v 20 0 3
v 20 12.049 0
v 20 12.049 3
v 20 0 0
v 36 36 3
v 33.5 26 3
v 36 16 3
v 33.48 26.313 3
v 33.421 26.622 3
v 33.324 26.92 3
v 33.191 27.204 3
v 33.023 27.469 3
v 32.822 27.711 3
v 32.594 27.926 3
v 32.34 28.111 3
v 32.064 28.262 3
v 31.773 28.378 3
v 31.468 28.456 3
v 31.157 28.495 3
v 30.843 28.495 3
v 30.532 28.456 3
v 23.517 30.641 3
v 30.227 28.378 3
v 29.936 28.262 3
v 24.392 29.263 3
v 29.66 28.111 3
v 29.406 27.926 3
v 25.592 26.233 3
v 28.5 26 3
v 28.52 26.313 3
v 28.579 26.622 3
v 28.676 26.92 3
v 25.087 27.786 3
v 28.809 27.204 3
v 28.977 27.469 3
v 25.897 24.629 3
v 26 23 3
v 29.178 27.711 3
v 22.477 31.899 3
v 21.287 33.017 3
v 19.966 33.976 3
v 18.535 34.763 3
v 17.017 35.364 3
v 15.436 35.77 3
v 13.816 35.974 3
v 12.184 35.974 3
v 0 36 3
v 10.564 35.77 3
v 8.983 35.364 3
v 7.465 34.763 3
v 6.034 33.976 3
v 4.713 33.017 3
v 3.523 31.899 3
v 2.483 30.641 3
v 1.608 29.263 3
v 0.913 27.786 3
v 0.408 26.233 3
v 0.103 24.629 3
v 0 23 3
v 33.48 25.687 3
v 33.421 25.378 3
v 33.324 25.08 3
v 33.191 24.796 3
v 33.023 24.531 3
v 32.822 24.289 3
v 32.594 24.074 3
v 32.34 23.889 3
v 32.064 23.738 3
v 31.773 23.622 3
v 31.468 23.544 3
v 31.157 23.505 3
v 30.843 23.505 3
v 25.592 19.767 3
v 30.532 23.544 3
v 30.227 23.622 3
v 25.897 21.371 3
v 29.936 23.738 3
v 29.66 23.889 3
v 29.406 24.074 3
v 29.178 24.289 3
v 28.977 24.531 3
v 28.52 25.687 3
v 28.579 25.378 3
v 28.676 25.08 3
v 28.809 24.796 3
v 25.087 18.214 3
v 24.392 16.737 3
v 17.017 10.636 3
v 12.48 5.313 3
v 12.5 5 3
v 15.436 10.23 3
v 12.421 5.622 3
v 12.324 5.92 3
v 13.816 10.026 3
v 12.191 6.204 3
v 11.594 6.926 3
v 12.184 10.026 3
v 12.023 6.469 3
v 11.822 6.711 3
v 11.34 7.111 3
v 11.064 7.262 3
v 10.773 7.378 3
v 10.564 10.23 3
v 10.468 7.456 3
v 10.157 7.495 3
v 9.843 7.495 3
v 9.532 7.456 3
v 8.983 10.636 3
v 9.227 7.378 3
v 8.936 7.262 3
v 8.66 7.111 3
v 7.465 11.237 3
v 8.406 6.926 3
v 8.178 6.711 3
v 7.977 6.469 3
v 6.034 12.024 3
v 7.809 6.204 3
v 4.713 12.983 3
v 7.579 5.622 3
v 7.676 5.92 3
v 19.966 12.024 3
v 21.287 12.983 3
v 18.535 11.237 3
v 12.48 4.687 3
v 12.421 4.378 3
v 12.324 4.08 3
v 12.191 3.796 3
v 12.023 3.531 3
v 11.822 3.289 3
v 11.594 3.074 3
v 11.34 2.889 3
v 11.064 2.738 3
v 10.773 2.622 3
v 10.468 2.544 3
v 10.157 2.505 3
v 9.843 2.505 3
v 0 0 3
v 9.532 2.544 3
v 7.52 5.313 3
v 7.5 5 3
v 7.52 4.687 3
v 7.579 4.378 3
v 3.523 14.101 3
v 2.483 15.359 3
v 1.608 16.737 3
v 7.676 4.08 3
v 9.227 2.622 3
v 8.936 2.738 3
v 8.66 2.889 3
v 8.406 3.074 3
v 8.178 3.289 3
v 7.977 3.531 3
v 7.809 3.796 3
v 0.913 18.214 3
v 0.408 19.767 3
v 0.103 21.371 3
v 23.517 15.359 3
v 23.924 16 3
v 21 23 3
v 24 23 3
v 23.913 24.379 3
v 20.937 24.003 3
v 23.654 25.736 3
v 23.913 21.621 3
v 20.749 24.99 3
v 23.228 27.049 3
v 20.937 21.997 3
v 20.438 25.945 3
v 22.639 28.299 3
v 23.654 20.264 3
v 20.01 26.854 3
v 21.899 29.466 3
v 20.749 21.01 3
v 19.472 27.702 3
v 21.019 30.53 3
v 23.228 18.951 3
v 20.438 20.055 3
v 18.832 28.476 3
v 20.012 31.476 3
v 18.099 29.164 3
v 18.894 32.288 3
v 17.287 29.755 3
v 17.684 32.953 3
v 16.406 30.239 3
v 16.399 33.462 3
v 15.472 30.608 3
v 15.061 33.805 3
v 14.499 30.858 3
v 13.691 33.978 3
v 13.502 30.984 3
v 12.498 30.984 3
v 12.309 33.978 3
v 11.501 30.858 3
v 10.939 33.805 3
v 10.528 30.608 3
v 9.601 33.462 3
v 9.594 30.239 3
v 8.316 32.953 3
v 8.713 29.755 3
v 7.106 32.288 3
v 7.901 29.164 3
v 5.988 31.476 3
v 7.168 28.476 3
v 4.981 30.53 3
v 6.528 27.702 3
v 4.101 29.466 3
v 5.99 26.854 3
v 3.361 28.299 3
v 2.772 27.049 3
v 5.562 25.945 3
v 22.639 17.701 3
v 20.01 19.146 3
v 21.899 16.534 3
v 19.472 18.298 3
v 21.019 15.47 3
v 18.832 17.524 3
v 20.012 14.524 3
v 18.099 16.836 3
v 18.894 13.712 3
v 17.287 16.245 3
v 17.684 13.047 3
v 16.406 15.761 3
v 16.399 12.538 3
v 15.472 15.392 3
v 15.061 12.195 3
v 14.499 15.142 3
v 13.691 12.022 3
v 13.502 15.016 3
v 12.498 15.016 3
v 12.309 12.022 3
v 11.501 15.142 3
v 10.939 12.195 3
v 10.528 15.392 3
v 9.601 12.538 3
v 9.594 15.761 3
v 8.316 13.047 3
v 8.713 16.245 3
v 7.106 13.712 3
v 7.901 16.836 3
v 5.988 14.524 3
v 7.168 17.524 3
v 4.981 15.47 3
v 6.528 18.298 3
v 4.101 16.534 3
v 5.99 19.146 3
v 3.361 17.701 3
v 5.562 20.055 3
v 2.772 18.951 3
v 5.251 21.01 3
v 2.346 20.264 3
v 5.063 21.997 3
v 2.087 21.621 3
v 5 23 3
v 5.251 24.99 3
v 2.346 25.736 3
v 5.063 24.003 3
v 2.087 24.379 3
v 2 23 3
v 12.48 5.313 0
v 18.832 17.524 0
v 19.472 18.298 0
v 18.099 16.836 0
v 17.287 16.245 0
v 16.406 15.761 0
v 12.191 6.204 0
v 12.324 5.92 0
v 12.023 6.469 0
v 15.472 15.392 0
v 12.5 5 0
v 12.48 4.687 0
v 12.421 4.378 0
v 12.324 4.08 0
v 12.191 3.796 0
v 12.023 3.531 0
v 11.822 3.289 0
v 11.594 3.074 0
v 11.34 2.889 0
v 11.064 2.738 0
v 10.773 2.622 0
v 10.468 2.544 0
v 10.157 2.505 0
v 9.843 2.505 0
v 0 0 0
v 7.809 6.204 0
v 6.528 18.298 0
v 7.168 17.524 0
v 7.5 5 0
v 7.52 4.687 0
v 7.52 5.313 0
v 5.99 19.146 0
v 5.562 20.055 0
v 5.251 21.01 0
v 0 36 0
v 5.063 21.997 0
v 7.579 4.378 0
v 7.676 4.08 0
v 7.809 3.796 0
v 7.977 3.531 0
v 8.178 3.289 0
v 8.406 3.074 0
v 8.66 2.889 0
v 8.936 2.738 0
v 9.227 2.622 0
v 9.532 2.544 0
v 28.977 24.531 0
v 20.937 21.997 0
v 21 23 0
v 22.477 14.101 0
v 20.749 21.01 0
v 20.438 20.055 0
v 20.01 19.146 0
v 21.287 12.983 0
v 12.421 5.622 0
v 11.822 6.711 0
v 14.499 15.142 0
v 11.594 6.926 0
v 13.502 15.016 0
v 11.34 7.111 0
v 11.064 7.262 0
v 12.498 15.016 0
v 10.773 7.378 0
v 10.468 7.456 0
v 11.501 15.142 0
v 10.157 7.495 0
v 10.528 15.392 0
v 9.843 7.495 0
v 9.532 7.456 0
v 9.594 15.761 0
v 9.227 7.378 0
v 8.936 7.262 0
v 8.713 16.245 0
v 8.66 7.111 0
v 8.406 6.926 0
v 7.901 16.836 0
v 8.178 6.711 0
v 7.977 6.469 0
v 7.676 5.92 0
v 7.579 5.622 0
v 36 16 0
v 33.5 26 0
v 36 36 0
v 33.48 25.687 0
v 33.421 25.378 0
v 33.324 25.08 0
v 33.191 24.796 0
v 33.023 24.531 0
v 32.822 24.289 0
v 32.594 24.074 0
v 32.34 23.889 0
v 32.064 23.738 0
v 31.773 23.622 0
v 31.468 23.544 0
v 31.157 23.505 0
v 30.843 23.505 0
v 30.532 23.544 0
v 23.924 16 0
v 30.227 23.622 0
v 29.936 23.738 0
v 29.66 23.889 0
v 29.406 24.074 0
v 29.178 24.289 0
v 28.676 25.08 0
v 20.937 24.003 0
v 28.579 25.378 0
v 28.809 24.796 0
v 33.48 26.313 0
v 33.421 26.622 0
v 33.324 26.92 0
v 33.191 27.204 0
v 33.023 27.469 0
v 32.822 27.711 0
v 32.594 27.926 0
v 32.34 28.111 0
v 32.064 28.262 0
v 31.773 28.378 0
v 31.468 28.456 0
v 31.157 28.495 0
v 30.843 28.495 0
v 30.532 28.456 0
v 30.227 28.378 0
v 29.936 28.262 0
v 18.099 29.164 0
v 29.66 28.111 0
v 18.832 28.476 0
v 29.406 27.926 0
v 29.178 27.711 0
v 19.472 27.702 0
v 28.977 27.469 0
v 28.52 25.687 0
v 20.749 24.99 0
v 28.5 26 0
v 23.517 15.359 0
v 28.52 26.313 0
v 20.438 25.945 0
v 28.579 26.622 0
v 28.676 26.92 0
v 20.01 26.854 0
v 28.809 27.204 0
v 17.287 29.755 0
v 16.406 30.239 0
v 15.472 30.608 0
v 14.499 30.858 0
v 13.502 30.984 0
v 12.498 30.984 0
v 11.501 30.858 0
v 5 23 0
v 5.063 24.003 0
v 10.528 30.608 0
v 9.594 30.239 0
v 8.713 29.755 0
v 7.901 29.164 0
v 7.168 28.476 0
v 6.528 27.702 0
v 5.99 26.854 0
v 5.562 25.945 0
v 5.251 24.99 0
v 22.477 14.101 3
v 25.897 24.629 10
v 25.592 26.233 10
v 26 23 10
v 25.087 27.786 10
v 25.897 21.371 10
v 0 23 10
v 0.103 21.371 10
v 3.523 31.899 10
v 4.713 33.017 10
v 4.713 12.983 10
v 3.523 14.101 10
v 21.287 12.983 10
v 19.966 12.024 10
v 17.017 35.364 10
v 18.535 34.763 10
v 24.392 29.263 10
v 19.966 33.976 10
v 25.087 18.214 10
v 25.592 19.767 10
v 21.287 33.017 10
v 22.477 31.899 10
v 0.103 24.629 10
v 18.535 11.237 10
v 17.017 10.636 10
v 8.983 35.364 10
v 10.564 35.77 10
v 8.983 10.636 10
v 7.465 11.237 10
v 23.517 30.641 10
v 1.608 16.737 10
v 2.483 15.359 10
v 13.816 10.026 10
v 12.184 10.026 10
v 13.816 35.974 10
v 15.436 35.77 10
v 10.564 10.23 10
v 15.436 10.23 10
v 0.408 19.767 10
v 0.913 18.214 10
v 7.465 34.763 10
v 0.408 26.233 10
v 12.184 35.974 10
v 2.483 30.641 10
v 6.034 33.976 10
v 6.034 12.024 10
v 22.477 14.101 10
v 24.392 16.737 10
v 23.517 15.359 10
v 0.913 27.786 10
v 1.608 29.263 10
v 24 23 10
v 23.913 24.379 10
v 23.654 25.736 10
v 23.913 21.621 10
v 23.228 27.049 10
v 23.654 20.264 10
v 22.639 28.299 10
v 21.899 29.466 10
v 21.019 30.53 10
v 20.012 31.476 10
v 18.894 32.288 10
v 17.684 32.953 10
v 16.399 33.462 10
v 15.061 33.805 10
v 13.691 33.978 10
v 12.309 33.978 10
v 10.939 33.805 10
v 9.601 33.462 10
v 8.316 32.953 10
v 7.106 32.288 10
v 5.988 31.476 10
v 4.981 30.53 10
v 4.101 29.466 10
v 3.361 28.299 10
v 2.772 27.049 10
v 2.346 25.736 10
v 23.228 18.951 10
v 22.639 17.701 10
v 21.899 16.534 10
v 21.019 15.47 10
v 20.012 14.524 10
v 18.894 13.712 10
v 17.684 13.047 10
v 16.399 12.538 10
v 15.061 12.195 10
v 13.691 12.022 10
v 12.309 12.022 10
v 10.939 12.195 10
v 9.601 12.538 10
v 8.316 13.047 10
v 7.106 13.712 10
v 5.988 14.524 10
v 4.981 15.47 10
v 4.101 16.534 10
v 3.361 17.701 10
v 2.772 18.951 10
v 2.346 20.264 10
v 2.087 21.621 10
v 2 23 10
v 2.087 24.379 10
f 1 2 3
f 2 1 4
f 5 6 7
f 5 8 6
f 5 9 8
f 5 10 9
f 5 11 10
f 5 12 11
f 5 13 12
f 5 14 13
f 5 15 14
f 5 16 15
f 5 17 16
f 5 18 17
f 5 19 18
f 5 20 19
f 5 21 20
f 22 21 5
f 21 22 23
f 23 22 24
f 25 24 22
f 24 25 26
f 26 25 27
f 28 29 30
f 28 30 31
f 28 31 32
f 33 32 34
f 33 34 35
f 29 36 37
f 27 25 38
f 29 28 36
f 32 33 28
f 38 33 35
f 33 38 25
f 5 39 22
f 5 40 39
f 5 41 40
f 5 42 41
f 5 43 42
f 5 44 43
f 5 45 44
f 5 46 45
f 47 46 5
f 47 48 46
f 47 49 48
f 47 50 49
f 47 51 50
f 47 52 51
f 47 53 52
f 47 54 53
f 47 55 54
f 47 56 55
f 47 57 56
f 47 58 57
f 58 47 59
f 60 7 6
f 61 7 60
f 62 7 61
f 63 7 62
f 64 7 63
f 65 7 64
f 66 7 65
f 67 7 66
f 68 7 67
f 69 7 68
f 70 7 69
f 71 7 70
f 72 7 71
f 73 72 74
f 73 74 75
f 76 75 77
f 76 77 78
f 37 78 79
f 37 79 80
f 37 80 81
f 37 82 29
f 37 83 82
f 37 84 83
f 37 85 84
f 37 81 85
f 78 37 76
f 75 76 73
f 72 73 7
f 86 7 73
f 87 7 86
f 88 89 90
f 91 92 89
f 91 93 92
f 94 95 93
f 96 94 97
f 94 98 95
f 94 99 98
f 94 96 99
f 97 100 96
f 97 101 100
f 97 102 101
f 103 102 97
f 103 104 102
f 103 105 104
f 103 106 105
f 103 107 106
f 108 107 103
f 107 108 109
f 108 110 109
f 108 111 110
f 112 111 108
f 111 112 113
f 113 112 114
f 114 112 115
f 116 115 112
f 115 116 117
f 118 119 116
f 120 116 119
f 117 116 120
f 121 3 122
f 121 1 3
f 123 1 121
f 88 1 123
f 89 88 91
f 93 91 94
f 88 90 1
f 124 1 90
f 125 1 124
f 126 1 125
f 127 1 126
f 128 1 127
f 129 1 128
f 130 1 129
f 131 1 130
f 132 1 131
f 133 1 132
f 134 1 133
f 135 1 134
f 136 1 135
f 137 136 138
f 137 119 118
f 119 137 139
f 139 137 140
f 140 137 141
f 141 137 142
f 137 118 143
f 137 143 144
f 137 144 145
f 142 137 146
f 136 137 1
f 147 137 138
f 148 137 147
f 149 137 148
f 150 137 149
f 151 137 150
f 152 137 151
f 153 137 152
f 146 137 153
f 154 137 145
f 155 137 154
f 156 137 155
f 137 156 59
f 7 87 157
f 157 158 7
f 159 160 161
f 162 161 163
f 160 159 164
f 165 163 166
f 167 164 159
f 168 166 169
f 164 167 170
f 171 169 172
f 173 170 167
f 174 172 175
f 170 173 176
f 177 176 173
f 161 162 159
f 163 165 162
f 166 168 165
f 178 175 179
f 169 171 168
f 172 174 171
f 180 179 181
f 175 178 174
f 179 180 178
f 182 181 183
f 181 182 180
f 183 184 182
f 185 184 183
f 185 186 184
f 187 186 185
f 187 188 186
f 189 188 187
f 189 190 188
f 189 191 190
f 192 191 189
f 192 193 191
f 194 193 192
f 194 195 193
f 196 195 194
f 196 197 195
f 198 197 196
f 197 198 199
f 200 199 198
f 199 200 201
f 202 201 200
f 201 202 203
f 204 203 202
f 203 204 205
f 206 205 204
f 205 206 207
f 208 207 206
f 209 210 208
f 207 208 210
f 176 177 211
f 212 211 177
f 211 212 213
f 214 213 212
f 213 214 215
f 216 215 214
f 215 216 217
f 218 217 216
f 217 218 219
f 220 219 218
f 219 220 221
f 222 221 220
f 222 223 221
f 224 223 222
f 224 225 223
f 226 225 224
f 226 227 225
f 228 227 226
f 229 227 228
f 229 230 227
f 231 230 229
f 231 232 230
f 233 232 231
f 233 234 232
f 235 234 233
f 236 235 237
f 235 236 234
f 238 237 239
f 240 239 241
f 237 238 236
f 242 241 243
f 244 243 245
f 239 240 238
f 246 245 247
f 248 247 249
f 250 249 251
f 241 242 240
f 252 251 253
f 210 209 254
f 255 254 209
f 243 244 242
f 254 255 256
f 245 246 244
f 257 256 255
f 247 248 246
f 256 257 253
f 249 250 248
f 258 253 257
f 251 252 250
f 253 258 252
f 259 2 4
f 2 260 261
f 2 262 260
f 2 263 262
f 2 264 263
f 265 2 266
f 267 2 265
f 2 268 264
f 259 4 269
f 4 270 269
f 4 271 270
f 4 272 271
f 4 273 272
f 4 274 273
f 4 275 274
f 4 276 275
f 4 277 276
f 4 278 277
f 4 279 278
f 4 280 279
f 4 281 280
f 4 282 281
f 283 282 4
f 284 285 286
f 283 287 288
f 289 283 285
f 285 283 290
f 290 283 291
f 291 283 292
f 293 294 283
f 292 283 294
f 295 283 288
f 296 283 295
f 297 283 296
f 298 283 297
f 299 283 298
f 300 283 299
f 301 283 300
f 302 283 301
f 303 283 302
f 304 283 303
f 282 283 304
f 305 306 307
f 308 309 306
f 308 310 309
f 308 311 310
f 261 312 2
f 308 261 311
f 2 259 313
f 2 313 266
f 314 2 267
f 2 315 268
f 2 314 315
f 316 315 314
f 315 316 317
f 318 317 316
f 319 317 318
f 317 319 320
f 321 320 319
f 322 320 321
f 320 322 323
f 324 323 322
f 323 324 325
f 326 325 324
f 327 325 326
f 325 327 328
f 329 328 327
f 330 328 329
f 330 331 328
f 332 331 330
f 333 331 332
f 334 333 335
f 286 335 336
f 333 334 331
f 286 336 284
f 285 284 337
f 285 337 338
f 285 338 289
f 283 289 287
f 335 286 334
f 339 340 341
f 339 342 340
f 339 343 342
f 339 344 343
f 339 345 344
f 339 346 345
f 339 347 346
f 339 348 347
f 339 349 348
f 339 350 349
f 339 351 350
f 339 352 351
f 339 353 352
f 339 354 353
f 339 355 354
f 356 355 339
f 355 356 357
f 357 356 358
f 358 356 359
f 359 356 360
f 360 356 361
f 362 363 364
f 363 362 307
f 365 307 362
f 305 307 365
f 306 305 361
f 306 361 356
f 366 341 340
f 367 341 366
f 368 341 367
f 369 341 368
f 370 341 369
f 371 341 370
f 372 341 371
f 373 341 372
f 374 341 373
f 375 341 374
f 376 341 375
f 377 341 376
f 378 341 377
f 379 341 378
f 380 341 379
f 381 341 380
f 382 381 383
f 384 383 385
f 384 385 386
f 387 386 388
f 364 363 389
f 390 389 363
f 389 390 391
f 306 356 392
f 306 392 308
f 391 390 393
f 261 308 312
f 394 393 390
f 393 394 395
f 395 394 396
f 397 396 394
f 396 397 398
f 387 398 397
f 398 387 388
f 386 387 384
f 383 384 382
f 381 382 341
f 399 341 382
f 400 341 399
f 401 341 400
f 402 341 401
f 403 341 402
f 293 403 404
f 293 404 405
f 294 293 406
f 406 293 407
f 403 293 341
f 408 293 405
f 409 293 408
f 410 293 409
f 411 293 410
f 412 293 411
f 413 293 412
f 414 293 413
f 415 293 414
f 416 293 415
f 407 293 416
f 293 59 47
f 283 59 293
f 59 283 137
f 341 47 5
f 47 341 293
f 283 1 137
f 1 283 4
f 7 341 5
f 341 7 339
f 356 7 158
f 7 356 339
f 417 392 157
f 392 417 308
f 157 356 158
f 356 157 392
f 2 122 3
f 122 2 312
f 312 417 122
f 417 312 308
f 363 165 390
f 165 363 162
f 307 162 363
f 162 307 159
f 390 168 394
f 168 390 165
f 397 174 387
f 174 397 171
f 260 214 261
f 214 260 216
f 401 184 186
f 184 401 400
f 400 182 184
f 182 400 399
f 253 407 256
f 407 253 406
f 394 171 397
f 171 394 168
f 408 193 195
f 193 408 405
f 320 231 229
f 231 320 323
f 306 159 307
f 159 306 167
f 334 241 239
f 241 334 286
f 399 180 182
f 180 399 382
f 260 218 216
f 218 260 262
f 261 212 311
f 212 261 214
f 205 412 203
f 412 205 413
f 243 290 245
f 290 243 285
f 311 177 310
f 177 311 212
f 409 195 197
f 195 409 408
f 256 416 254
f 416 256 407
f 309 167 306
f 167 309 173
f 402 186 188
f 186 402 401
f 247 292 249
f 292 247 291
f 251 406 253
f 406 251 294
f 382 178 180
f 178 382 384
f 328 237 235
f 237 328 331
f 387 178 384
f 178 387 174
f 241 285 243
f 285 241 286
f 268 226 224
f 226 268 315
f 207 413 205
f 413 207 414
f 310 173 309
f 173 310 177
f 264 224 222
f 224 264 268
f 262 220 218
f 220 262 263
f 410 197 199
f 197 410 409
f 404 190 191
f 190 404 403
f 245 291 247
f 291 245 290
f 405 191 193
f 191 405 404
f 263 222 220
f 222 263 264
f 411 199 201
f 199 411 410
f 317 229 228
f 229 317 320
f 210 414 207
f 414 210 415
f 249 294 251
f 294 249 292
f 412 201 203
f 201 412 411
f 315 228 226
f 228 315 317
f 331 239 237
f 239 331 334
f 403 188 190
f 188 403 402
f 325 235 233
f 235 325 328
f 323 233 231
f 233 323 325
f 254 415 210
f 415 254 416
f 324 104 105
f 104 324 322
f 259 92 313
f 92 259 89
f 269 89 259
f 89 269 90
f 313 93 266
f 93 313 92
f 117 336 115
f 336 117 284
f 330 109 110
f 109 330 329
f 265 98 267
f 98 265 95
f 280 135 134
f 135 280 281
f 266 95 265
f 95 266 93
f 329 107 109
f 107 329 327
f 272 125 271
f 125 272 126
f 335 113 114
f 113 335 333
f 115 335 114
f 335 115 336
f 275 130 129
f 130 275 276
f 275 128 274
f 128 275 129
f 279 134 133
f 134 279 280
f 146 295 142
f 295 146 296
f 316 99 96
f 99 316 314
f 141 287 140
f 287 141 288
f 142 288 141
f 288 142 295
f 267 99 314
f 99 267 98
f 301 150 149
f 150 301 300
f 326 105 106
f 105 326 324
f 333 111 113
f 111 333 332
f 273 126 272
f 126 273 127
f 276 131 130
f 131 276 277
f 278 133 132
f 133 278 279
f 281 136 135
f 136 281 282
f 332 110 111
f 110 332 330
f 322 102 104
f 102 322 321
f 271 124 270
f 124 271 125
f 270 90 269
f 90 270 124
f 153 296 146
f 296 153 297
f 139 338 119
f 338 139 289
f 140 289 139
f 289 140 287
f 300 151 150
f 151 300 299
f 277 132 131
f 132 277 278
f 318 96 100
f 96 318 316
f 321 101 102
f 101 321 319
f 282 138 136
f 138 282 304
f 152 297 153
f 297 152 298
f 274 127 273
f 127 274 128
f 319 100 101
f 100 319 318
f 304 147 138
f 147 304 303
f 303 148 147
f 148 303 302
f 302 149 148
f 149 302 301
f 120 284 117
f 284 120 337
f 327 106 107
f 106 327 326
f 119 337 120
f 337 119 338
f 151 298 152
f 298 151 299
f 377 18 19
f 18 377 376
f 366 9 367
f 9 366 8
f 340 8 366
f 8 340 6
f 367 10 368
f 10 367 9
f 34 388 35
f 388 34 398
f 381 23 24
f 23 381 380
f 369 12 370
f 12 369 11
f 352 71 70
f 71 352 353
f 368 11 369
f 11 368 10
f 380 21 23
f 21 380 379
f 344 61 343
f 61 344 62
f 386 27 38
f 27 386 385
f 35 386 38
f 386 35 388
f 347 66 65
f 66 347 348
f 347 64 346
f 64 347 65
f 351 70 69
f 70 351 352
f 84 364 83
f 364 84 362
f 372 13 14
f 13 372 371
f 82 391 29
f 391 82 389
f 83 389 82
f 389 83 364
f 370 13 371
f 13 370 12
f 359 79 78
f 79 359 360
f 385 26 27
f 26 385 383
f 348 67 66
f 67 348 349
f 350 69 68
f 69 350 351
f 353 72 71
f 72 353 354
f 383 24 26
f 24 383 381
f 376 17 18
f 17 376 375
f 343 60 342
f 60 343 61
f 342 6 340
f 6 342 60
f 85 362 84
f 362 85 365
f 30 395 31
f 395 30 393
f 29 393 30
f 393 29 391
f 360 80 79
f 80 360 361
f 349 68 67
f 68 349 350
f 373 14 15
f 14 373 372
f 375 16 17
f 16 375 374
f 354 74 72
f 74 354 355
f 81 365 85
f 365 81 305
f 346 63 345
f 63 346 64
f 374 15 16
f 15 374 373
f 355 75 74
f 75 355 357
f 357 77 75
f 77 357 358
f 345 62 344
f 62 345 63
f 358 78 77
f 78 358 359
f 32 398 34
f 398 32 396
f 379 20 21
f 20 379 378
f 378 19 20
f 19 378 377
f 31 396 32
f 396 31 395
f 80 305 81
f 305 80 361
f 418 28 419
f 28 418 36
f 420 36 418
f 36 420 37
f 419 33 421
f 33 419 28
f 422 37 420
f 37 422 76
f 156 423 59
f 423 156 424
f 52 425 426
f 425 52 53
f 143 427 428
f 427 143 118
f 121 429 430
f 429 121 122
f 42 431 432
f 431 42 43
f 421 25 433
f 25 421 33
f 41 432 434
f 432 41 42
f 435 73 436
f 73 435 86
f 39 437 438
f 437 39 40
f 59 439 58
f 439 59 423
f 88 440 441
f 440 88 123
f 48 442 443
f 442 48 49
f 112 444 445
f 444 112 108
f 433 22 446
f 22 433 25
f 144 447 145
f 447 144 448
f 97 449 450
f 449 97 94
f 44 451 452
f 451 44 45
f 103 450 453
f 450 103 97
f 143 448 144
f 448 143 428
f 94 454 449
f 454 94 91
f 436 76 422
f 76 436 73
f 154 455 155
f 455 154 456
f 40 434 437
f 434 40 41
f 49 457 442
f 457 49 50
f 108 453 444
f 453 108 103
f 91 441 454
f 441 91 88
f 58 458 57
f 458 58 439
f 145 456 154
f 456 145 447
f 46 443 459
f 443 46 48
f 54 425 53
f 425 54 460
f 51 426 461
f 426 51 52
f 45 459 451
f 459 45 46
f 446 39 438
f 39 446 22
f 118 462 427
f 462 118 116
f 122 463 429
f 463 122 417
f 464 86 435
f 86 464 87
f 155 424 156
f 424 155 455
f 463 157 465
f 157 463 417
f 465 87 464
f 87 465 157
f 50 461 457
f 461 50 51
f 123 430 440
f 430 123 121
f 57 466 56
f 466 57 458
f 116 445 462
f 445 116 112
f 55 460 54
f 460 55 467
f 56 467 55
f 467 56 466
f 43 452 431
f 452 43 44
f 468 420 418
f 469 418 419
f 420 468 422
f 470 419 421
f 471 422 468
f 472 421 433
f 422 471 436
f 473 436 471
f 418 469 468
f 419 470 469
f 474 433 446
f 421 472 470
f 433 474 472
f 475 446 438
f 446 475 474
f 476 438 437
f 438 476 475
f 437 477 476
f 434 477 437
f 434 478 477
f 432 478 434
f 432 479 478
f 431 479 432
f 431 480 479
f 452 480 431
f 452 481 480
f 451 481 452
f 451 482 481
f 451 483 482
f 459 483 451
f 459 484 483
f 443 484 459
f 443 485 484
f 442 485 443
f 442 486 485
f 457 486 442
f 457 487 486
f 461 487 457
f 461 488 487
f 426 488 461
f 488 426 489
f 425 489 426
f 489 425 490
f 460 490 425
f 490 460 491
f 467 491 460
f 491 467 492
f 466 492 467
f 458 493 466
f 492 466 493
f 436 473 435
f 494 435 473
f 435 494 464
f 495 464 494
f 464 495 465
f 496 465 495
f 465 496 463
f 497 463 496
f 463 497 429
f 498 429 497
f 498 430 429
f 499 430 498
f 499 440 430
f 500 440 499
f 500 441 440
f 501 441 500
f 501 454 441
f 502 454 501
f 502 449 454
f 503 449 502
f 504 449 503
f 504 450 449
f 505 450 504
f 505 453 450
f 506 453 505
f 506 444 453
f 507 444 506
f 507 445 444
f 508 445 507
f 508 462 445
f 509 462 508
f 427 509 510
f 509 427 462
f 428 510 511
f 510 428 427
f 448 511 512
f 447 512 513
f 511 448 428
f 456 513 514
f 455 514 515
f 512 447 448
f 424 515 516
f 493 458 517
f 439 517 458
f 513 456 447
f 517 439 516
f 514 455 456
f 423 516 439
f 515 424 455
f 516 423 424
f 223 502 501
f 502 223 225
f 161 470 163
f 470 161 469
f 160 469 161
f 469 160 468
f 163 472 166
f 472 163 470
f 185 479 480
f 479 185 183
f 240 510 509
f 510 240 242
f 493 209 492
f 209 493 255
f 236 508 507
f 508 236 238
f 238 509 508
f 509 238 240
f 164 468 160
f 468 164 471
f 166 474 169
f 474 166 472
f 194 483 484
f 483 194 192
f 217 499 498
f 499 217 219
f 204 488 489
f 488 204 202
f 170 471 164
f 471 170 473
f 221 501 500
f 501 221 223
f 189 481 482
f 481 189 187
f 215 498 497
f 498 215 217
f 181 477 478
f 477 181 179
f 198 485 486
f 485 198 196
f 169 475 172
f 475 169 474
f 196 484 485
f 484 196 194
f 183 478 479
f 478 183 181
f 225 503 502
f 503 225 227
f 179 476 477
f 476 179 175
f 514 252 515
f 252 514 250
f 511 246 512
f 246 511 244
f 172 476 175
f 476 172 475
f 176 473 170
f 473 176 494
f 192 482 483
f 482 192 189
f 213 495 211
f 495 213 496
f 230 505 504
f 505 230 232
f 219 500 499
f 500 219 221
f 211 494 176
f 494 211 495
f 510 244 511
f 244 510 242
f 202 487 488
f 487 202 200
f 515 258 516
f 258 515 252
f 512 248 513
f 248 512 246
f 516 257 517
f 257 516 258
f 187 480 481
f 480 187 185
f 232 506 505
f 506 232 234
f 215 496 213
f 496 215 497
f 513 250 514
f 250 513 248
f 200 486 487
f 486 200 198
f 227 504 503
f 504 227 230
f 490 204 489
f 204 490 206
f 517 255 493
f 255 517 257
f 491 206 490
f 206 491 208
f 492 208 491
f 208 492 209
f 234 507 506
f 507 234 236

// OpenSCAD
$fn=50;
dim_x=26;
dim_y=50-4;
plate_thickness=3;
hole_pos=5;
module holder(){
difference(){
    union(){
cube([20,36,plate_thickness]);
 translate([0,36-20,0])cube([36,20,plate_thickness]);  
  translate([dim_x/2,dim_y/2,0])   cylinder(r=13,h=plate_thickness);   
    }
    translate([dim_x/2,dim_y/2,0]) cylinder(r=8,h=7);
    #translate([10,hole_pos,0]) cylinder(r=2.5,h=7);
     translate([10,dim_y-hole_pos,0]) cylinder(r=2.5,h=7);
    translate([36-hole_pos,36-10,0]) cylinder(r=2.5,h=7);
    
};


    translate([dim_x/2,dim_y/2,plate_thickness]){
        difference(){
cylinder(r=13,h=7);
cylinder(r=11,h=7);
        }
    
}

};
holder();
module cap(){
translate([50,0,0]) 

difference(){
cylinder(r=15,h=9);
cylinder(r=13.1,h=7.5);
    cylinder(r=9,h=20);
        }
    };
        
        
       //# translate([dim_x/2,dim_y/2,0]) cylinder(r=4,h=15);
        
       //# cube([20,100,20]);
